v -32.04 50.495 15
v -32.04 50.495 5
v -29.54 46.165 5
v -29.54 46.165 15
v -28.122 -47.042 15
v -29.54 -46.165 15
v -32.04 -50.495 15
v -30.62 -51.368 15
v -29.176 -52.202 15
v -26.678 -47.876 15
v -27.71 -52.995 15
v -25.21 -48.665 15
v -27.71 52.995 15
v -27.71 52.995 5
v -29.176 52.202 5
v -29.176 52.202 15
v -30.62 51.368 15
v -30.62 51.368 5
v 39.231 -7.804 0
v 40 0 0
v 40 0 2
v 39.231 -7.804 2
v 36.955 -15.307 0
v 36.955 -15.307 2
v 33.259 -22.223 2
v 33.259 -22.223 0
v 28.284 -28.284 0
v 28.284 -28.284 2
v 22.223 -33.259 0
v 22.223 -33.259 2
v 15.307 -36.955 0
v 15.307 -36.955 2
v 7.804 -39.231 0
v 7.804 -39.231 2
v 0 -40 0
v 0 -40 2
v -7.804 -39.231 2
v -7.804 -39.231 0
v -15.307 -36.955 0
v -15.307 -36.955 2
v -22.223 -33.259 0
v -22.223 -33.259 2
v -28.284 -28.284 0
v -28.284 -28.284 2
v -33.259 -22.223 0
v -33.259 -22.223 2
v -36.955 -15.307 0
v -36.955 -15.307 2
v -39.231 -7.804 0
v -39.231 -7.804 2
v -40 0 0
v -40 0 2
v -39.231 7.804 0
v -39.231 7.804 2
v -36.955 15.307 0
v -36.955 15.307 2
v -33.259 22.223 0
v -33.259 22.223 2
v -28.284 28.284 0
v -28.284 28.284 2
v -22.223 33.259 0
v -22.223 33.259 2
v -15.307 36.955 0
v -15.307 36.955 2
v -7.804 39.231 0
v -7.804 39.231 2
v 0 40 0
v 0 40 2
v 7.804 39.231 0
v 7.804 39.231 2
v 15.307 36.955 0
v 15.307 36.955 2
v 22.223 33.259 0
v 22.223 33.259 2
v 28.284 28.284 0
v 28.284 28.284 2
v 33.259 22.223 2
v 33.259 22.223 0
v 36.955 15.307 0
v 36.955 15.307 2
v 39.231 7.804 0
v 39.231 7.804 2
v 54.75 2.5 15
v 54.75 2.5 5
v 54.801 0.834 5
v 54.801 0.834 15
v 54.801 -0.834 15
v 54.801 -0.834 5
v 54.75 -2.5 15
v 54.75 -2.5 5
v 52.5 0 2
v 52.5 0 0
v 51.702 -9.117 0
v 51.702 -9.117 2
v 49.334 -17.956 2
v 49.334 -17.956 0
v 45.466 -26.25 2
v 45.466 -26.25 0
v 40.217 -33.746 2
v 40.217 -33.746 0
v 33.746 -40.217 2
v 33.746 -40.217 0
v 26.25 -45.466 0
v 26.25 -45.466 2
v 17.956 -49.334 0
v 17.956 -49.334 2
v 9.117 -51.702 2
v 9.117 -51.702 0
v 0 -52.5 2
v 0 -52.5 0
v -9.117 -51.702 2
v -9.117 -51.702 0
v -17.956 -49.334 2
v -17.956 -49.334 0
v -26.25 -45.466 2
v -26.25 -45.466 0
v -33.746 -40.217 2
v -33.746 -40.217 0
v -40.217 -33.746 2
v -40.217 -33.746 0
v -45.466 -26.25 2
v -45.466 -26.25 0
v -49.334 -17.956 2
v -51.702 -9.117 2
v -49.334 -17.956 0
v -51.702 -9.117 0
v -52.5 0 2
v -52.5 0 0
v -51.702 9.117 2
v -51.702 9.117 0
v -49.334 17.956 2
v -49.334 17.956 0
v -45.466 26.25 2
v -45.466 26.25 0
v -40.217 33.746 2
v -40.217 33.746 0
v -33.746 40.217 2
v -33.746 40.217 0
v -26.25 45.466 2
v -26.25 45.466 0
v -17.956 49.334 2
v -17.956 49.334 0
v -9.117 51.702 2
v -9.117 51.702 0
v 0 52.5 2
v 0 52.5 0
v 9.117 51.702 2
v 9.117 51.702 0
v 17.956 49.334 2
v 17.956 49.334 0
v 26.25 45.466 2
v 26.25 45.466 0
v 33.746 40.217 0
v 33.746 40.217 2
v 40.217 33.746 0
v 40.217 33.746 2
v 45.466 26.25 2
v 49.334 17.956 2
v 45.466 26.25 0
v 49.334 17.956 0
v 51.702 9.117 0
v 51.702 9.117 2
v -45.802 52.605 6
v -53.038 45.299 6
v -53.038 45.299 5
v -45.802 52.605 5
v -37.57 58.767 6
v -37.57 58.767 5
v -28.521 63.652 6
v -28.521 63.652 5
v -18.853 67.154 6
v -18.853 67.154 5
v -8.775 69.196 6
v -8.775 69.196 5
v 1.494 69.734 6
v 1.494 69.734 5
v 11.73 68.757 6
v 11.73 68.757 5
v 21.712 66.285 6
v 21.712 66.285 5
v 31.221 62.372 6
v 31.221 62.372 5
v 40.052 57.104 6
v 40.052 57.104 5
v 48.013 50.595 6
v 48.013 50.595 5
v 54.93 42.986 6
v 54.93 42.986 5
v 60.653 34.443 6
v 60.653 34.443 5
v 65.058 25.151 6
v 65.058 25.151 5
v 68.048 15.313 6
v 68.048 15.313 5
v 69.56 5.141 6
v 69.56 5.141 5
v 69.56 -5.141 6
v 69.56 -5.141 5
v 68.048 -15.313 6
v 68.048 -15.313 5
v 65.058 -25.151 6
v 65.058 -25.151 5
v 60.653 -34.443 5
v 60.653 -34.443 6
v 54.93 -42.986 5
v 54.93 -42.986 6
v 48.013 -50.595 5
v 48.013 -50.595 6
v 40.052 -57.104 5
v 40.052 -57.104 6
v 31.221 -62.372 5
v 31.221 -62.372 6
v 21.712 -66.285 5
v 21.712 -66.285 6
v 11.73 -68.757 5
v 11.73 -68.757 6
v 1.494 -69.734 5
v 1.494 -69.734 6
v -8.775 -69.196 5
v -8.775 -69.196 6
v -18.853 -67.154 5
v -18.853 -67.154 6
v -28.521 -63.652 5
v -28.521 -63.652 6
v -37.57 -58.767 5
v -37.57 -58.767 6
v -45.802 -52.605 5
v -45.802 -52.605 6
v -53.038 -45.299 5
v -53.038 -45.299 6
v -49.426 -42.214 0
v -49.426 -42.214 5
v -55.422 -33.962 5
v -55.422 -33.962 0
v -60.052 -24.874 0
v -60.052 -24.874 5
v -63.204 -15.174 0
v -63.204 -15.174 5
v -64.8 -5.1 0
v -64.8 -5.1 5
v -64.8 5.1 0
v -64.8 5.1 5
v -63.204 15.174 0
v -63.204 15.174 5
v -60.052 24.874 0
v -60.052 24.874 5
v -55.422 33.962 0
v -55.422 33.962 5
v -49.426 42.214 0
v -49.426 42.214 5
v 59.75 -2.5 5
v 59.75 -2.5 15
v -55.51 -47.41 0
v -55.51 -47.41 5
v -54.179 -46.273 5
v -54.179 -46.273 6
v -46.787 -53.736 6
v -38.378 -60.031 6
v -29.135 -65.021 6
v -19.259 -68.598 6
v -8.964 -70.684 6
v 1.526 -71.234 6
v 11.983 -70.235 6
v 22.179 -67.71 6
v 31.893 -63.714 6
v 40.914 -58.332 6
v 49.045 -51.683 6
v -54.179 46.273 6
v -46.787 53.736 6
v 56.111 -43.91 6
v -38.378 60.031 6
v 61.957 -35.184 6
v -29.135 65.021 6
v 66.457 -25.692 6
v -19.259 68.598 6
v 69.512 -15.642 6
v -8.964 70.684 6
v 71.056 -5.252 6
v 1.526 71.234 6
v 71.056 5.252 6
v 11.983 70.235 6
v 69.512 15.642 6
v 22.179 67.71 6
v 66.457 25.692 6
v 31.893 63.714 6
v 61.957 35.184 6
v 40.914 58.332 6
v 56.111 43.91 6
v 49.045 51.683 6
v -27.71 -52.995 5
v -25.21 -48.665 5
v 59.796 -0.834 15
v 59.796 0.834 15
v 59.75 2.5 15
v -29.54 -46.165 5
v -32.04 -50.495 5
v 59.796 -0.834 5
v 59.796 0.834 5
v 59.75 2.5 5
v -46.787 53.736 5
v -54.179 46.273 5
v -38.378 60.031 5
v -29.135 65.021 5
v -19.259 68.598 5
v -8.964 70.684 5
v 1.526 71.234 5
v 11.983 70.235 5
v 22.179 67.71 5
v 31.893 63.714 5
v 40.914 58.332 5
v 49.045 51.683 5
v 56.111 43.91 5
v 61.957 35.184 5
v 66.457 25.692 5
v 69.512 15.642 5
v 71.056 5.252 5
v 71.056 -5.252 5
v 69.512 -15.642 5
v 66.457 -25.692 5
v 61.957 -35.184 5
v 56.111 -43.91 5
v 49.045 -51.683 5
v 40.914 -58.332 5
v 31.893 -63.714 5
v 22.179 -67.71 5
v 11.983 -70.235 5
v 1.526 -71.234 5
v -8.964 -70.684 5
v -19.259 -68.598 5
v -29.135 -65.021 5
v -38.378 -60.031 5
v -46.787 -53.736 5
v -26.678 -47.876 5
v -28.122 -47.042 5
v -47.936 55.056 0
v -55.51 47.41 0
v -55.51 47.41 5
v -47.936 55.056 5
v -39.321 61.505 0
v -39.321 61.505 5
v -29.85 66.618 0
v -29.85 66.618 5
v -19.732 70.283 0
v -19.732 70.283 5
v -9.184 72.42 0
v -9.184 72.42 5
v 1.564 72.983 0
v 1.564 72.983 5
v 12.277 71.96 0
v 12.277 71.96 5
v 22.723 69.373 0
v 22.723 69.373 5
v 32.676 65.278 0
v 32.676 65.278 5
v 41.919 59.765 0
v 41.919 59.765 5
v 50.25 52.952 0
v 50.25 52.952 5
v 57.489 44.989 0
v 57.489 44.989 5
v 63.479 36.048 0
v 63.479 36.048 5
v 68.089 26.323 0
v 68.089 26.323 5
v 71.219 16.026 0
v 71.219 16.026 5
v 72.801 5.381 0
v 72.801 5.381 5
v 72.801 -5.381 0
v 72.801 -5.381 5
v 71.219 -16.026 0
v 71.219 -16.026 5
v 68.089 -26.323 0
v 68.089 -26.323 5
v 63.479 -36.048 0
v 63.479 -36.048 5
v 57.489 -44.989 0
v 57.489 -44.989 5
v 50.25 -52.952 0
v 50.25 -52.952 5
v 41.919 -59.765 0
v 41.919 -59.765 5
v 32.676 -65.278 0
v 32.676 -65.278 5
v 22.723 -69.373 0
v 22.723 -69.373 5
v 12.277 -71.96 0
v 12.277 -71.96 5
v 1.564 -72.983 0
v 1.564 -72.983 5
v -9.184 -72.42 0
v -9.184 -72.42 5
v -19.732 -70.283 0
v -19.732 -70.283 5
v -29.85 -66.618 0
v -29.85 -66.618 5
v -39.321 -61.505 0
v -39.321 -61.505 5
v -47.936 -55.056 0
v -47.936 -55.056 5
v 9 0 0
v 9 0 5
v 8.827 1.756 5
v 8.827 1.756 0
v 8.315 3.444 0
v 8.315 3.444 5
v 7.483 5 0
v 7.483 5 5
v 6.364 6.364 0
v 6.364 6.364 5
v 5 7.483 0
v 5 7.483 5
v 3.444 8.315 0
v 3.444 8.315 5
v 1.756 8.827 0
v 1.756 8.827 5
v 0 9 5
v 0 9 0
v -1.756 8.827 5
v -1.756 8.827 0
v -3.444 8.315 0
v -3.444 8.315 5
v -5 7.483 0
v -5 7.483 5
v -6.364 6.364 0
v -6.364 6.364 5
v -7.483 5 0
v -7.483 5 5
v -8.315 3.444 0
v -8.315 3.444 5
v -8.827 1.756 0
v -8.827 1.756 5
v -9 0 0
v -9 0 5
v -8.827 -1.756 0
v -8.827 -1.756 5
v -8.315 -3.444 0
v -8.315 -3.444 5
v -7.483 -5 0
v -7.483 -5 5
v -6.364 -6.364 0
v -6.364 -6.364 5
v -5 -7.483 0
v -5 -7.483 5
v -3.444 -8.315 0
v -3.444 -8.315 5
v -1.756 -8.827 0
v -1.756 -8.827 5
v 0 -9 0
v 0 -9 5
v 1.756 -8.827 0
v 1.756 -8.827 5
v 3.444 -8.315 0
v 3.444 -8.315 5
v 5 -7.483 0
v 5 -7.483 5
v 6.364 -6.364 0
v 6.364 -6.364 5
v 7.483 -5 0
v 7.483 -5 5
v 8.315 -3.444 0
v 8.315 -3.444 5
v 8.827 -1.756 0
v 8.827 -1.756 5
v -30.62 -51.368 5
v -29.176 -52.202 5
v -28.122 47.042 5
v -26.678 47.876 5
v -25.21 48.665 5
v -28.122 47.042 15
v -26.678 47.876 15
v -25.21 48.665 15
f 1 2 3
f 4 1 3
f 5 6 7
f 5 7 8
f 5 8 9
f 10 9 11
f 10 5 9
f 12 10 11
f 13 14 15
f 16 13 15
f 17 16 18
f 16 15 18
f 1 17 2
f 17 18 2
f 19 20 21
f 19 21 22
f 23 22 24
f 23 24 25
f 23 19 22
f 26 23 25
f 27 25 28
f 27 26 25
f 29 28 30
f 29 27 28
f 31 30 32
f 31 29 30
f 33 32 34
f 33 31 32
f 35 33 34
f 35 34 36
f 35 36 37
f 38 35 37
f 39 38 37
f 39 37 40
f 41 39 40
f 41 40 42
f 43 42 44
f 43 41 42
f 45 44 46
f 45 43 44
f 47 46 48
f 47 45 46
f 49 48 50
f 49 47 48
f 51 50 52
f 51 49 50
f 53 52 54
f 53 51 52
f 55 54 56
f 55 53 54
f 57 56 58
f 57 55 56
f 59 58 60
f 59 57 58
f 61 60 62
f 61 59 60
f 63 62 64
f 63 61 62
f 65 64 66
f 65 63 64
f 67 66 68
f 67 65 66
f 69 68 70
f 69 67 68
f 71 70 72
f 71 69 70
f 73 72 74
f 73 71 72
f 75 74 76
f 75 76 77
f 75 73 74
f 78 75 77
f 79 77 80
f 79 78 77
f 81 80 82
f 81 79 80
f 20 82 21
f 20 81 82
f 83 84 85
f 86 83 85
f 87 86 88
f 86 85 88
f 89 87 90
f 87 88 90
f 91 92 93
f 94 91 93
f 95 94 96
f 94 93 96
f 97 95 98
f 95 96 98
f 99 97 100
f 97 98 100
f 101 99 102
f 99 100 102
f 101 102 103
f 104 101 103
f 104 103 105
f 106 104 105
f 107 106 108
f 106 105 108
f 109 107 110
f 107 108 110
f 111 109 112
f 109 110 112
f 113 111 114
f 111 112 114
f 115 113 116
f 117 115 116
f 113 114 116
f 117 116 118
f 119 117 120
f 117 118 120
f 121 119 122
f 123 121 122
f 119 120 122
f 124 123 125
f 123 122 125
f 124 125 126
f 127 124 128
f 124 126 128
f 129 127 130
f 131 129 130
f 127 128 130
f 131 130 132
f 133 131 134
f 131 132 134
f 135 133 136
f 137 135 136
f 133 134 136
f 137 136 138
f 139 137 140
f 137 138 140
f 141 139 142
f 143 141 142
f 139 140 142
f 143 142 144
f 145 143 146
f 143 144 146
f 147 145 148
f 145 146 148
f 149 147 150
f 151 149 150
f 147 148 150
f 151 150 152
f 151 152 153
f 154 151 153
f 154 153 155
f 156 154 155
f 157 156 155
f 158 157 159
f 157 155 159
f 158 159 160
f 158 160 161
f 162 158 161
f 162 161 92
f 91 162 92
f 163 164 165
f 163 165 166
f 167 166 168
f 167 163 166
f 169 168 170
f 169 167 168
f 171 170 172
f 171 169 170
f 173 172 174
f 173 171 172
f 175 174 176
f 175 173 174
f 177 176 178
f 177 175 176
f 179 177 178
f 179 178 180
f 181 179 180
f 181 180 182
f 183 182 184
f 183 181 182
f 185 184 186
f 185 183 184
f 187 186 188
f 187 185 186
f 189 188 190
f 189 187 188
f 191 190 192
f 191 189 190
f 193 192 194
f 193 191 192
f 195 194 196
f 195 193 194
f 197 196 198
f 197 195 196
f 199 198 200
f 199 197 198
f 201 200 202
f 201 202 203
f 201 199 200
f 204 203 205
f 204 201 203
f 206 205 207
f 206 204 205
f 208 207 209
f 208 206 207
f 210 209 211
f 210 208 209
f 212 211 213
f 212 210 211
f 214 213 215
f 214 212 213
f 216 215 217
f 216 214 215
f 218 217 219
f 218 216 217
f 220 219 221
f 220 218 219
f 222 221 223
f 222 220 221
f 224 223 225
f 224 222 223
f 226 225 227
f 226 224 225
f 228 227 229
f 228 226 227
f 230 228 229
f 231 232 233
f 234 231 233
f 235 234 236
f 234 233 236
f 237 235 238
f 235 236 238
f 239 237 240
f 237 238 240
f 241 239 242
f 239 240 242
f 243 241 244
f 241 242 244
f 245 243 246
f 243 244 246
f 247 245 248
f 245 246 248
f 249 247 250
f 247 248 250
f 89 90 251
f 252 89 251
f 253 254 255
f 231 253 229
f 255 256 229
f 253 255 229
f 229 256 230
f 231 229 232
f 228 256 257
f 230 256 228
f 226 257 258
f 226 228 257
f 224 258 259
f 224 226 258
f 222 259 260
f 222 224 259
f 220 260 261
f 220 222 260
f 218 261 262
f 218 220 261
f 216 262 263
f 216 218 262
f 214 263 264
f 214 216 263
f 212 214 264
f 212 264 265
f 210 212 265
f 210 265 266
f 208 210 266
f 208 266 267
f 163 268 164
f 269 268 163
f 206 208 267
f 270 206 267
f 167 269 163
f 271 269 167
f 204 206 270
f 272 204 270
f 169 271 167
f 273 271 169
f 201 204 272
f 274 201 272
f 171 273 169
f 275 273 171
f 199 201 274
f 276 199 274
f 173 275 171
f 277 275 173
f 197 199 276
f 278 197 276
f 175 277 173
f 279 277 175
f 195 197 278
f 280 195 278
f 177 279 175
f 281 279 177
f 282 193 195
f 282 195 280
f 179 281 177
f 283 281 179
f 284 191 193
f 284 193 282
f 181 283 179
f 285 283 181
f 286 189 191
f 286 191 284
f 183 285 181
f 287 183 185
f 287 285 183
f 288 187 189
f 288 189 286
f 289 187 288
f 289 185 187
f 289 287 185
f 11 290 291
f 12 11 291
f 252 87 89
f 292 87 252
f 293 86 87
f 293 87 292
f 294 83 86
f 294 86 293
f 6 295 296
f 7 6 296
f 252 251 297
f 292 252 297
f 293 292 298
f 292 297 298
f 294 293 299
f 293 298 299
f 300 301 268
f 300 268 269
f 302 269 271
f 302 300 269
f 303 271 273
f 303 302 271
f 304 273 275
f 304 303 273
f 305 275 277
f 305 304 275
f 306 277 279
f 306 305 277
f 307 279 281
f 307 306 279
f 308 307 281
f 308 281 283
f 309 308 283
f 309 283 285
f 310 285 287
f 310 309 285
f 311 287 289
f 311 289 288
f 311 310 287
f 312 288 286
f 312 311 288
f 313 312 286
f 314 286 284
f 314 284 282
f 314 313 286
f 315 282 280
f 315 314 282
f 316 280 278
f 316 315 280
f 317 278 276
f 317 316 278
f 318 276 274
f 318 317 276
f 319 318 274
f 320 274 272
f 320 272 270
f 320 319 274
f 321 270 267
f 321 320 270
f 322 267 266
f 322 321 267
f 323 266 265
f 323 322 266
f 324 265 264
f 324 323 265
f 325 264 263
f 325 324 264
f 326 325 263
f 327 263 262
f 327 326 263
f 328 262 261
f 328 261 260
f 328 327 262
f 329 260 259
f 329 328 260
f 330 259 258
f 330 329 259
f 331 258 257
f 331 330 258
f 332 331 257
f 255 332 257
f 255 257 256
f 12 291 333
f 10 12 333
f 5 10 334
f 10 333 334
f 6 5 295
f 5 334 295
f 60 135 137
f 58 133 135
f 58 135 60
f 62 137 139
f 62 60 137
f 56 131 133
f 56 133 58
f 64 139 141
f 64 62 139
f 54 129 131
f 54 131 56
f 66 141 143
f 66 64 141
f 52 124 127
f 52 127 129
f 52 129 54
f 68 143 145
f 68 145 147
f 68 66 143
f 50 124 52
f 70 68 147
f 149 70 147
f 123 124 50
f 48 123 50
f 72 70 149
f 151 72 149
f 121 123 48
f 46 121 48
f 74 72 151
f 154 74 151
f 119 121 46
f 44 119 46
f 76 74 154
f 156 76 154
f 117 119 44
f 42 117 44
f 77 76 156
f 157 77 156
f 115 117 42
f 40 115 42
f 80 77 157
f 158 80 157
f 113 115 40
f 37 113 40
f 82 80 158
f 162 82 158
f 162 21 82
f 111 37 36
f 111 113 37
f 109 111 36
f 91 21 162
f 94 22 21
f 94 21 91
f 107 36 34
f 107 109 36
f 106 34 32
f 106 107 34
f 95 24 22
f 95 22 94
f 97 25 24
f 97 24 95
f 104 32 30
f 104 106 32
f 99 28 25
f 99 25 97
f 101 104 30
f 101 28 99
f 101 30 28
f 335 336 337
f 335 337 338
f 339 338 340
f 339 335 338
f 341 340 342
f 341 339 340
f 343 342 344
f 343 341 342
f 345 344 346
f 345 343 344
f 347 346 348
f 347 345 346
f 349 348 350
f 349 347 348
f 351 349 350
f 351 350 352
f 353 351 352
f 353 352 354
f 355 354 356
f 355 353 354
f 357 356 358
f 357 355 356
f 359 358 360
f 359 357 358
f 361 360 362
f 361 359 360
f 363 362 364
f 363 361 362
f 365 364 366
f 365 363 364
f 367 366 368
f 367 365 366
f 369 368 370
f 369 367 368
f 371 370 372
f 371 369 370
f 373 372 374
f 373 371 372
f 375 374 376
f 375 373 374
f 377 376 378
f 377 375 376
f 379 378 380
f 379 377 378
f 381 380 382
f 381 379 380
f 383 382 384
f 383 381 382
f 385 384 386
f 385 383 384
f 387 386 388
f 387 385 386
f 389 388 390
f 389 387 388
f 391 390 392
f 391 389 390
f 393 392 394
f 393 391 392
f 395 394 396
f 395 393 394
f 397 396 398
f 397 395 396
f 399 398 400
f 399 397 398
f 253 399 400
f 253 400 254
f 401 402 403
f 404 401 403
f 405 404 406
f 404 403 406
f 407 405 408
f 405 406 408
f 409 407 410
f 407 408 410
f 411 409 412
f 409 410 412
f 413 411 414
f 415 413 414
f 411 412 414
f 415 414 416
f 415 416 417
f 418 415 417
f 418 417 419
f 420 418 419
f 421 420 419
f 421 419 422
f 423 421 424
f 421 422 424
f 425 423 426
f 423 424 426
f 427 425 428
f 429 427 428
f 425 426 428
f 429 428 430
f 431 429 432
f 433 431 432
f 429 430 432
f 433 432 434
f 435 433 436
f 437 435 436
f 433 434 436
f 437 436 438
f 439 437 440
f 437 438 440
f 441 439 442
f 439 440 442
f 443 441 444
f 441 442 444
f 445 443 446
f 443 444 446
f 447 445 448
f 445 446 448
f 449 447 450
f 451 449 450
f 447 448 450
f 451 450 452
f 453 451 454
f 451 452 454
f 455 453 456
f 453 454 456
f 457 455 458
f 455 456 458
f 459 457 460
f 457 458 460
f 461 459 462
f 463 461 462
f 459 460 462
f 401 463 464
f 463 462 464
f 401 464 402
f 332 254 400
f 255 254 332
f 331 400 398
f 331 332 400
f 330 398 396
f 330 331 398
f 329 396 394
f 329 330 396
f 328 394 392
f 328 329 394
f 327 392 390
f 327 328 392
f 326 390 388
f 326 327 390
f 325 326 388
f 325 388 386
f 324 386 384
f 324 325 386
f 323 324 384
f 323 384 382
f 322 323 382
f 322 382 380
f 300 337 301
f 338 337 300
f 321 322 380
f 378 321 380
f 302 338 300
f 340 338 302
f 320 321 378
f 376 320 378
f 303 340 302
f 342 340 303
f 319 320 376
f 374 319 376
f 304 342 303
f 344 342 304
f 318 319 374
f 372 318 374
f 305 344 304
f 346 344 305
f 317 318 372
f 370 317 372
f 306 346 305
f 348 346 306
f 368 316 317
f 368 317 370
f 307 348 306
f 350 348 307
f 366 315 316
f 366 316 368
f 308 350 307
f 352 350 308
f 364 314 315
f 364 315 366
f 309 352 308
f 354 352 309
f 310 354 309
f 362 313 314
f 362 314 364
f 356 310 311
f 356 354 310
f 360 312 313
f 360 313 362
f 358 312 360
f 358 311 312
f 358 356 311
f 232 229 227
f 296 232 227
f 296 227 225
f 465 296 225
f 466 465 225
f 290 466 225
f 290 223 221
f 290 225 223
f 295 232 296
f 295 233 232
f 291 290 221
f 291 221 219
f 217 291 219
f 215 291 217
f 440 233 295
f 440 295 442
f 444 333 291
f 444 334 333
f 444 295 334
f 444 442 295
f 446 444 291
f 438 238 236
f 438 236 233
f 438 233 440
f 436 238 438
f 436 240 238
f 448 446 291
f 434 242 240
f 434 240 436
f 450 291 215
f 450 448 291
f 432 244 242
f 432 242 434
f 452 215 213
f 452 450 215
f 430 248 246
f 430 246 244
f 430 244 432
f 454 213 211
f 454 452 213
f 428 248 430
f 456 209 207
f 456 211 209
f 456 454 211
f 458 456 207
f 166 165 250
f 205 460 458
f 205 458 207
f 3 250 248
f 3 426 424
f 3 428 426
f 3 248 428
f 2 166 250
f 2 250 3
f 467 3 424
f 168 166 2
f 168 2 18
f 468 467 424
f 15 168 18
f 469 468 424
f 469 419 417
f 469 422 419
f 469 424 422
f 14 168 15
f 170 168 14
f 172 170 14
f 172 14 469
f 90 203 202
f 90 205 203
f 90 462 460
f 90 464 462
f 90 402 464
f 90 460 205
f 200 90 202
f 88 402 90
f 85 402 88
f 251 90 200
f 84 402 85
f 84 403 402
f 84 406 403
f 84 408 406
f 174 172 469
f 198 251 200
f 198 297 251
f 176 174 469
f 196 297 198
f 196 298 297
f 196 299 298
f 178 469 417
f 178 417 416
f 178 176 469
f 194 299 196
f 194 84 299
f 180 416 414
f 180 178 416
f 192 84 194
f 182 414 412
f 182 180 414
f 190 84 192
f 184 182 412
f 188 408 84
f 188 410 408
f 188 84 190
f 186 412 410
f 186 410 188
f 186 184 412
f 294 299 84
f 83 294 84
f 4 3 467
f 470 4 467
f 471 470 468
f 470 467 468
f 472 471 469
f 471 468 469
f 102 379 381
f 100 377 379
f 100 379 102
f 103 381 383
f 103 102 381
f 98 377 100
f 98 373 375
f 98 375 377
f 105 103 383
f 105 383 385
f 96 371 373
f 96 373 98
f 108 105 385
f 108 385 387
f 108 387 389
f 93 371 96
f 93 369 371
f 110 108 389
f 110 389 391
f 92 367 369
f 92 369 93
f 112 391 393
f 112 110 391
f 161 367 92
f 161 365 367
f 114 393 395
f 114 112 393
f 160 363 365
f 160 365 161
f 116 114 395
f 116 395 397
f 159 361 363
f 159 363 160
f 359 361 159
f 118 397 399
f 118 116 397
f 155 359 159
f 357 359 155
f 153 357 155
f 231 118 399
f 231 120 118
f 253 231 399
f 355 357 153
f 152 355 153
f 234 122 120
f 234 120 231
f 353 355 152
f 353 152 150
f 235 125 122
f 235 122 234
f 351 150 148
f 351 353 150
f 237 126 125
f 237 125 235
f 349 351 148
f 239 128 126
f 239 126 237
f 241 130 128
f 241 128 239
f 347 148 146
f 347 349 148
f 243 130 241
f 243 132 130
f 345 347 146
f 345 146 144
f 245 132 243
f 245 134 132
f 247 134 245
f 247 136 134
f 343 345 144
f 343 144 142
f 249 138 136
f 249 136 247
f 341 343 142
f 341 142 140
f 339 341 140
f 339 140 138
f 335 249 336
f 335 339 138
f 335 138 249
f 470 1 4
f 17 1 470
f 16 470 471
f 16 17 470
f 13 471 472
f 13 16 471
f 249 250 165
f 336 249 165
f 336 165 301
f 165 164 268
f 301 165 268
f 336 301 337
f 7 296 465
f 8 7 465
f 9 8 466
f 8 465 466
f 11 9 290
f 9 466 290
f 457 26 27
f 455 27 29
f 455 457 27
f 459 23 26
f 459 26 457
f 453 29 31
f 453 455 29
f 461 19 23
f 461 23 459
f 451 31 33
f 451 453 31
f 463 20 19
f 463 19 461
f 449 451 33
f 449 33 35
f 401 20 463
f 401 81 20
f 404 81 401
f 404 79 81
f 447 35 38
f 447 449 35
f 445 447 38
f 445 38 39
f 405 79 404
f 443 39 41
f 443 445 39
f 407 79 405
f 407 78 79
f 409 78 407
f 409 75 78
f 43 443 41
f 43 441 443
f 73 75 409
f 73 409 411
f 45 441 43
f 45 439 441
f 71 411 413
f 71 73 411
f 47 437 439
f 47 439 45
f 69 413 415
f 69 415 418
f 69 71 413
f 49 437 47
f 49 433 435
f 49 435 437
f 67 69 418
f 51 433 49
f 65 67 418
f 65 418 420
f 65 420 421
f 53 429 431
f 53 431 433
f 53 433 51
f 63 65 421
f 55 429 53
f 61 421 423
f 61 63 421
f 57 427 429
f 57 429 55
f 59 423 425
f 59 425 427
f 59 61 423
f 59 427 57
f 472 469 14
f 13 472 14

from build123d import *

# Parameters (mm, degrees)
F2_R     = 52.5
F2_R_2   = 40
F3_DEPTH = 2
F4_R     = 9
F5_DEPTH = 5
F7_DEPTH = 10
F9_DEPTH = 6


with BuildPart() as f1:
    # F0 (on Front) → F1 (revolve)
    with BuildSketch(Plane.XZ):
        Polygon((-73, 0), (0, 0), (0, 5), (-69.75, 5), (-69.75, 6), (-71.25, 6), (-71.25, 5), (-73, 5), align=None)
    revolve(axis=Axis((0, 0, 2.5), (0, 0, -1)))

    # F2 (on face) → F3 (cut)
    with BuildSketch(Plane(origin=(0, 0, 0), x_dir=(1, 0, 0), z_dir=(0, 0, -1))):
        Circle(F2_R)
        Circle(F2_R_2, mode=Mode.SUBTRACT)
    extrude(amount=-F3_DEPTH, mode=Mode.SUBTRACT)

    # F4 (on face) → F5 (cut, through all)
    with BuildSketch(Plane.XY.offset(5)):
        Circle(F4_R)
    extrude(amount=-F5_DEPTH, mode=Mode.SUBTRACT)

    # F6 (on face) → F7 (join)
    with BuildSketch(Plane.XY.offset(5)):
        with BuildLine():
            ThreePointArc((59.75, -2.5), (59.802278, 0), (59.75, 2.5))
            Line((59.75, 2.5), (54.75, 2.5))
            ThreePointArc((54.75, 2.5), (54.807048, 0), (54.75, -2.5))
            Line((54.75, -2.5), (59.75, -2.5))
        make_face()
        with BuildLine():
            ThreePointArc((-29.540064, 46.164891), (-27.403524, 47.464296), (-25.209936, 48.664891))
            Line((-25.209936, 48.664891), (-27.709936, 52.995018))
            ThreePointArc((-27.709936, 52.995018), (-29.901139, 51.790292), (-32.040064, 50.495018))
            Line((-32.040064, 50.495018), (-29.540064, 46.164891))
        make_face()
        with BuildLine():
            ThreePointArc((-25.209936, -48.664891), (-27.403524, -47.464296), (-29.540064, -46.164891))
            Line((-29.540064, -46.164891), (-32.040064, -50.495018))
            ThreePointArc((-32.040064, -50.495018), (-29.901139, -51.790292), (-27.709936, -52.995018))
            Line((-27.709936, -52.995018), (-25.209936, -48.664891))
        make_face()
    extrude(amount=F7_DEPTH)

    # F8 (on face) → F9 (cut, through all)
    with BuildSketch(Plane.XY.offset(6)):
        with BuildLine():
            Line((-49.426388, 42.214123), (-55.509635, 47.409708))
            ThreePointArc((-55.509635, 47.409708), (-73, 0), (-55.509635, -47.409708))
            Line((-55.509635, -47.409708), (-49.426388, -42.214123))
            ThreePointArc((-49.426388, -42.214123), (-65, 0), (-49.426388, 42.214123))
        make_face()
    extrude(amount=-F9_DEPTH, mode=Mode.SUBTRACT)


solid = f1.part
